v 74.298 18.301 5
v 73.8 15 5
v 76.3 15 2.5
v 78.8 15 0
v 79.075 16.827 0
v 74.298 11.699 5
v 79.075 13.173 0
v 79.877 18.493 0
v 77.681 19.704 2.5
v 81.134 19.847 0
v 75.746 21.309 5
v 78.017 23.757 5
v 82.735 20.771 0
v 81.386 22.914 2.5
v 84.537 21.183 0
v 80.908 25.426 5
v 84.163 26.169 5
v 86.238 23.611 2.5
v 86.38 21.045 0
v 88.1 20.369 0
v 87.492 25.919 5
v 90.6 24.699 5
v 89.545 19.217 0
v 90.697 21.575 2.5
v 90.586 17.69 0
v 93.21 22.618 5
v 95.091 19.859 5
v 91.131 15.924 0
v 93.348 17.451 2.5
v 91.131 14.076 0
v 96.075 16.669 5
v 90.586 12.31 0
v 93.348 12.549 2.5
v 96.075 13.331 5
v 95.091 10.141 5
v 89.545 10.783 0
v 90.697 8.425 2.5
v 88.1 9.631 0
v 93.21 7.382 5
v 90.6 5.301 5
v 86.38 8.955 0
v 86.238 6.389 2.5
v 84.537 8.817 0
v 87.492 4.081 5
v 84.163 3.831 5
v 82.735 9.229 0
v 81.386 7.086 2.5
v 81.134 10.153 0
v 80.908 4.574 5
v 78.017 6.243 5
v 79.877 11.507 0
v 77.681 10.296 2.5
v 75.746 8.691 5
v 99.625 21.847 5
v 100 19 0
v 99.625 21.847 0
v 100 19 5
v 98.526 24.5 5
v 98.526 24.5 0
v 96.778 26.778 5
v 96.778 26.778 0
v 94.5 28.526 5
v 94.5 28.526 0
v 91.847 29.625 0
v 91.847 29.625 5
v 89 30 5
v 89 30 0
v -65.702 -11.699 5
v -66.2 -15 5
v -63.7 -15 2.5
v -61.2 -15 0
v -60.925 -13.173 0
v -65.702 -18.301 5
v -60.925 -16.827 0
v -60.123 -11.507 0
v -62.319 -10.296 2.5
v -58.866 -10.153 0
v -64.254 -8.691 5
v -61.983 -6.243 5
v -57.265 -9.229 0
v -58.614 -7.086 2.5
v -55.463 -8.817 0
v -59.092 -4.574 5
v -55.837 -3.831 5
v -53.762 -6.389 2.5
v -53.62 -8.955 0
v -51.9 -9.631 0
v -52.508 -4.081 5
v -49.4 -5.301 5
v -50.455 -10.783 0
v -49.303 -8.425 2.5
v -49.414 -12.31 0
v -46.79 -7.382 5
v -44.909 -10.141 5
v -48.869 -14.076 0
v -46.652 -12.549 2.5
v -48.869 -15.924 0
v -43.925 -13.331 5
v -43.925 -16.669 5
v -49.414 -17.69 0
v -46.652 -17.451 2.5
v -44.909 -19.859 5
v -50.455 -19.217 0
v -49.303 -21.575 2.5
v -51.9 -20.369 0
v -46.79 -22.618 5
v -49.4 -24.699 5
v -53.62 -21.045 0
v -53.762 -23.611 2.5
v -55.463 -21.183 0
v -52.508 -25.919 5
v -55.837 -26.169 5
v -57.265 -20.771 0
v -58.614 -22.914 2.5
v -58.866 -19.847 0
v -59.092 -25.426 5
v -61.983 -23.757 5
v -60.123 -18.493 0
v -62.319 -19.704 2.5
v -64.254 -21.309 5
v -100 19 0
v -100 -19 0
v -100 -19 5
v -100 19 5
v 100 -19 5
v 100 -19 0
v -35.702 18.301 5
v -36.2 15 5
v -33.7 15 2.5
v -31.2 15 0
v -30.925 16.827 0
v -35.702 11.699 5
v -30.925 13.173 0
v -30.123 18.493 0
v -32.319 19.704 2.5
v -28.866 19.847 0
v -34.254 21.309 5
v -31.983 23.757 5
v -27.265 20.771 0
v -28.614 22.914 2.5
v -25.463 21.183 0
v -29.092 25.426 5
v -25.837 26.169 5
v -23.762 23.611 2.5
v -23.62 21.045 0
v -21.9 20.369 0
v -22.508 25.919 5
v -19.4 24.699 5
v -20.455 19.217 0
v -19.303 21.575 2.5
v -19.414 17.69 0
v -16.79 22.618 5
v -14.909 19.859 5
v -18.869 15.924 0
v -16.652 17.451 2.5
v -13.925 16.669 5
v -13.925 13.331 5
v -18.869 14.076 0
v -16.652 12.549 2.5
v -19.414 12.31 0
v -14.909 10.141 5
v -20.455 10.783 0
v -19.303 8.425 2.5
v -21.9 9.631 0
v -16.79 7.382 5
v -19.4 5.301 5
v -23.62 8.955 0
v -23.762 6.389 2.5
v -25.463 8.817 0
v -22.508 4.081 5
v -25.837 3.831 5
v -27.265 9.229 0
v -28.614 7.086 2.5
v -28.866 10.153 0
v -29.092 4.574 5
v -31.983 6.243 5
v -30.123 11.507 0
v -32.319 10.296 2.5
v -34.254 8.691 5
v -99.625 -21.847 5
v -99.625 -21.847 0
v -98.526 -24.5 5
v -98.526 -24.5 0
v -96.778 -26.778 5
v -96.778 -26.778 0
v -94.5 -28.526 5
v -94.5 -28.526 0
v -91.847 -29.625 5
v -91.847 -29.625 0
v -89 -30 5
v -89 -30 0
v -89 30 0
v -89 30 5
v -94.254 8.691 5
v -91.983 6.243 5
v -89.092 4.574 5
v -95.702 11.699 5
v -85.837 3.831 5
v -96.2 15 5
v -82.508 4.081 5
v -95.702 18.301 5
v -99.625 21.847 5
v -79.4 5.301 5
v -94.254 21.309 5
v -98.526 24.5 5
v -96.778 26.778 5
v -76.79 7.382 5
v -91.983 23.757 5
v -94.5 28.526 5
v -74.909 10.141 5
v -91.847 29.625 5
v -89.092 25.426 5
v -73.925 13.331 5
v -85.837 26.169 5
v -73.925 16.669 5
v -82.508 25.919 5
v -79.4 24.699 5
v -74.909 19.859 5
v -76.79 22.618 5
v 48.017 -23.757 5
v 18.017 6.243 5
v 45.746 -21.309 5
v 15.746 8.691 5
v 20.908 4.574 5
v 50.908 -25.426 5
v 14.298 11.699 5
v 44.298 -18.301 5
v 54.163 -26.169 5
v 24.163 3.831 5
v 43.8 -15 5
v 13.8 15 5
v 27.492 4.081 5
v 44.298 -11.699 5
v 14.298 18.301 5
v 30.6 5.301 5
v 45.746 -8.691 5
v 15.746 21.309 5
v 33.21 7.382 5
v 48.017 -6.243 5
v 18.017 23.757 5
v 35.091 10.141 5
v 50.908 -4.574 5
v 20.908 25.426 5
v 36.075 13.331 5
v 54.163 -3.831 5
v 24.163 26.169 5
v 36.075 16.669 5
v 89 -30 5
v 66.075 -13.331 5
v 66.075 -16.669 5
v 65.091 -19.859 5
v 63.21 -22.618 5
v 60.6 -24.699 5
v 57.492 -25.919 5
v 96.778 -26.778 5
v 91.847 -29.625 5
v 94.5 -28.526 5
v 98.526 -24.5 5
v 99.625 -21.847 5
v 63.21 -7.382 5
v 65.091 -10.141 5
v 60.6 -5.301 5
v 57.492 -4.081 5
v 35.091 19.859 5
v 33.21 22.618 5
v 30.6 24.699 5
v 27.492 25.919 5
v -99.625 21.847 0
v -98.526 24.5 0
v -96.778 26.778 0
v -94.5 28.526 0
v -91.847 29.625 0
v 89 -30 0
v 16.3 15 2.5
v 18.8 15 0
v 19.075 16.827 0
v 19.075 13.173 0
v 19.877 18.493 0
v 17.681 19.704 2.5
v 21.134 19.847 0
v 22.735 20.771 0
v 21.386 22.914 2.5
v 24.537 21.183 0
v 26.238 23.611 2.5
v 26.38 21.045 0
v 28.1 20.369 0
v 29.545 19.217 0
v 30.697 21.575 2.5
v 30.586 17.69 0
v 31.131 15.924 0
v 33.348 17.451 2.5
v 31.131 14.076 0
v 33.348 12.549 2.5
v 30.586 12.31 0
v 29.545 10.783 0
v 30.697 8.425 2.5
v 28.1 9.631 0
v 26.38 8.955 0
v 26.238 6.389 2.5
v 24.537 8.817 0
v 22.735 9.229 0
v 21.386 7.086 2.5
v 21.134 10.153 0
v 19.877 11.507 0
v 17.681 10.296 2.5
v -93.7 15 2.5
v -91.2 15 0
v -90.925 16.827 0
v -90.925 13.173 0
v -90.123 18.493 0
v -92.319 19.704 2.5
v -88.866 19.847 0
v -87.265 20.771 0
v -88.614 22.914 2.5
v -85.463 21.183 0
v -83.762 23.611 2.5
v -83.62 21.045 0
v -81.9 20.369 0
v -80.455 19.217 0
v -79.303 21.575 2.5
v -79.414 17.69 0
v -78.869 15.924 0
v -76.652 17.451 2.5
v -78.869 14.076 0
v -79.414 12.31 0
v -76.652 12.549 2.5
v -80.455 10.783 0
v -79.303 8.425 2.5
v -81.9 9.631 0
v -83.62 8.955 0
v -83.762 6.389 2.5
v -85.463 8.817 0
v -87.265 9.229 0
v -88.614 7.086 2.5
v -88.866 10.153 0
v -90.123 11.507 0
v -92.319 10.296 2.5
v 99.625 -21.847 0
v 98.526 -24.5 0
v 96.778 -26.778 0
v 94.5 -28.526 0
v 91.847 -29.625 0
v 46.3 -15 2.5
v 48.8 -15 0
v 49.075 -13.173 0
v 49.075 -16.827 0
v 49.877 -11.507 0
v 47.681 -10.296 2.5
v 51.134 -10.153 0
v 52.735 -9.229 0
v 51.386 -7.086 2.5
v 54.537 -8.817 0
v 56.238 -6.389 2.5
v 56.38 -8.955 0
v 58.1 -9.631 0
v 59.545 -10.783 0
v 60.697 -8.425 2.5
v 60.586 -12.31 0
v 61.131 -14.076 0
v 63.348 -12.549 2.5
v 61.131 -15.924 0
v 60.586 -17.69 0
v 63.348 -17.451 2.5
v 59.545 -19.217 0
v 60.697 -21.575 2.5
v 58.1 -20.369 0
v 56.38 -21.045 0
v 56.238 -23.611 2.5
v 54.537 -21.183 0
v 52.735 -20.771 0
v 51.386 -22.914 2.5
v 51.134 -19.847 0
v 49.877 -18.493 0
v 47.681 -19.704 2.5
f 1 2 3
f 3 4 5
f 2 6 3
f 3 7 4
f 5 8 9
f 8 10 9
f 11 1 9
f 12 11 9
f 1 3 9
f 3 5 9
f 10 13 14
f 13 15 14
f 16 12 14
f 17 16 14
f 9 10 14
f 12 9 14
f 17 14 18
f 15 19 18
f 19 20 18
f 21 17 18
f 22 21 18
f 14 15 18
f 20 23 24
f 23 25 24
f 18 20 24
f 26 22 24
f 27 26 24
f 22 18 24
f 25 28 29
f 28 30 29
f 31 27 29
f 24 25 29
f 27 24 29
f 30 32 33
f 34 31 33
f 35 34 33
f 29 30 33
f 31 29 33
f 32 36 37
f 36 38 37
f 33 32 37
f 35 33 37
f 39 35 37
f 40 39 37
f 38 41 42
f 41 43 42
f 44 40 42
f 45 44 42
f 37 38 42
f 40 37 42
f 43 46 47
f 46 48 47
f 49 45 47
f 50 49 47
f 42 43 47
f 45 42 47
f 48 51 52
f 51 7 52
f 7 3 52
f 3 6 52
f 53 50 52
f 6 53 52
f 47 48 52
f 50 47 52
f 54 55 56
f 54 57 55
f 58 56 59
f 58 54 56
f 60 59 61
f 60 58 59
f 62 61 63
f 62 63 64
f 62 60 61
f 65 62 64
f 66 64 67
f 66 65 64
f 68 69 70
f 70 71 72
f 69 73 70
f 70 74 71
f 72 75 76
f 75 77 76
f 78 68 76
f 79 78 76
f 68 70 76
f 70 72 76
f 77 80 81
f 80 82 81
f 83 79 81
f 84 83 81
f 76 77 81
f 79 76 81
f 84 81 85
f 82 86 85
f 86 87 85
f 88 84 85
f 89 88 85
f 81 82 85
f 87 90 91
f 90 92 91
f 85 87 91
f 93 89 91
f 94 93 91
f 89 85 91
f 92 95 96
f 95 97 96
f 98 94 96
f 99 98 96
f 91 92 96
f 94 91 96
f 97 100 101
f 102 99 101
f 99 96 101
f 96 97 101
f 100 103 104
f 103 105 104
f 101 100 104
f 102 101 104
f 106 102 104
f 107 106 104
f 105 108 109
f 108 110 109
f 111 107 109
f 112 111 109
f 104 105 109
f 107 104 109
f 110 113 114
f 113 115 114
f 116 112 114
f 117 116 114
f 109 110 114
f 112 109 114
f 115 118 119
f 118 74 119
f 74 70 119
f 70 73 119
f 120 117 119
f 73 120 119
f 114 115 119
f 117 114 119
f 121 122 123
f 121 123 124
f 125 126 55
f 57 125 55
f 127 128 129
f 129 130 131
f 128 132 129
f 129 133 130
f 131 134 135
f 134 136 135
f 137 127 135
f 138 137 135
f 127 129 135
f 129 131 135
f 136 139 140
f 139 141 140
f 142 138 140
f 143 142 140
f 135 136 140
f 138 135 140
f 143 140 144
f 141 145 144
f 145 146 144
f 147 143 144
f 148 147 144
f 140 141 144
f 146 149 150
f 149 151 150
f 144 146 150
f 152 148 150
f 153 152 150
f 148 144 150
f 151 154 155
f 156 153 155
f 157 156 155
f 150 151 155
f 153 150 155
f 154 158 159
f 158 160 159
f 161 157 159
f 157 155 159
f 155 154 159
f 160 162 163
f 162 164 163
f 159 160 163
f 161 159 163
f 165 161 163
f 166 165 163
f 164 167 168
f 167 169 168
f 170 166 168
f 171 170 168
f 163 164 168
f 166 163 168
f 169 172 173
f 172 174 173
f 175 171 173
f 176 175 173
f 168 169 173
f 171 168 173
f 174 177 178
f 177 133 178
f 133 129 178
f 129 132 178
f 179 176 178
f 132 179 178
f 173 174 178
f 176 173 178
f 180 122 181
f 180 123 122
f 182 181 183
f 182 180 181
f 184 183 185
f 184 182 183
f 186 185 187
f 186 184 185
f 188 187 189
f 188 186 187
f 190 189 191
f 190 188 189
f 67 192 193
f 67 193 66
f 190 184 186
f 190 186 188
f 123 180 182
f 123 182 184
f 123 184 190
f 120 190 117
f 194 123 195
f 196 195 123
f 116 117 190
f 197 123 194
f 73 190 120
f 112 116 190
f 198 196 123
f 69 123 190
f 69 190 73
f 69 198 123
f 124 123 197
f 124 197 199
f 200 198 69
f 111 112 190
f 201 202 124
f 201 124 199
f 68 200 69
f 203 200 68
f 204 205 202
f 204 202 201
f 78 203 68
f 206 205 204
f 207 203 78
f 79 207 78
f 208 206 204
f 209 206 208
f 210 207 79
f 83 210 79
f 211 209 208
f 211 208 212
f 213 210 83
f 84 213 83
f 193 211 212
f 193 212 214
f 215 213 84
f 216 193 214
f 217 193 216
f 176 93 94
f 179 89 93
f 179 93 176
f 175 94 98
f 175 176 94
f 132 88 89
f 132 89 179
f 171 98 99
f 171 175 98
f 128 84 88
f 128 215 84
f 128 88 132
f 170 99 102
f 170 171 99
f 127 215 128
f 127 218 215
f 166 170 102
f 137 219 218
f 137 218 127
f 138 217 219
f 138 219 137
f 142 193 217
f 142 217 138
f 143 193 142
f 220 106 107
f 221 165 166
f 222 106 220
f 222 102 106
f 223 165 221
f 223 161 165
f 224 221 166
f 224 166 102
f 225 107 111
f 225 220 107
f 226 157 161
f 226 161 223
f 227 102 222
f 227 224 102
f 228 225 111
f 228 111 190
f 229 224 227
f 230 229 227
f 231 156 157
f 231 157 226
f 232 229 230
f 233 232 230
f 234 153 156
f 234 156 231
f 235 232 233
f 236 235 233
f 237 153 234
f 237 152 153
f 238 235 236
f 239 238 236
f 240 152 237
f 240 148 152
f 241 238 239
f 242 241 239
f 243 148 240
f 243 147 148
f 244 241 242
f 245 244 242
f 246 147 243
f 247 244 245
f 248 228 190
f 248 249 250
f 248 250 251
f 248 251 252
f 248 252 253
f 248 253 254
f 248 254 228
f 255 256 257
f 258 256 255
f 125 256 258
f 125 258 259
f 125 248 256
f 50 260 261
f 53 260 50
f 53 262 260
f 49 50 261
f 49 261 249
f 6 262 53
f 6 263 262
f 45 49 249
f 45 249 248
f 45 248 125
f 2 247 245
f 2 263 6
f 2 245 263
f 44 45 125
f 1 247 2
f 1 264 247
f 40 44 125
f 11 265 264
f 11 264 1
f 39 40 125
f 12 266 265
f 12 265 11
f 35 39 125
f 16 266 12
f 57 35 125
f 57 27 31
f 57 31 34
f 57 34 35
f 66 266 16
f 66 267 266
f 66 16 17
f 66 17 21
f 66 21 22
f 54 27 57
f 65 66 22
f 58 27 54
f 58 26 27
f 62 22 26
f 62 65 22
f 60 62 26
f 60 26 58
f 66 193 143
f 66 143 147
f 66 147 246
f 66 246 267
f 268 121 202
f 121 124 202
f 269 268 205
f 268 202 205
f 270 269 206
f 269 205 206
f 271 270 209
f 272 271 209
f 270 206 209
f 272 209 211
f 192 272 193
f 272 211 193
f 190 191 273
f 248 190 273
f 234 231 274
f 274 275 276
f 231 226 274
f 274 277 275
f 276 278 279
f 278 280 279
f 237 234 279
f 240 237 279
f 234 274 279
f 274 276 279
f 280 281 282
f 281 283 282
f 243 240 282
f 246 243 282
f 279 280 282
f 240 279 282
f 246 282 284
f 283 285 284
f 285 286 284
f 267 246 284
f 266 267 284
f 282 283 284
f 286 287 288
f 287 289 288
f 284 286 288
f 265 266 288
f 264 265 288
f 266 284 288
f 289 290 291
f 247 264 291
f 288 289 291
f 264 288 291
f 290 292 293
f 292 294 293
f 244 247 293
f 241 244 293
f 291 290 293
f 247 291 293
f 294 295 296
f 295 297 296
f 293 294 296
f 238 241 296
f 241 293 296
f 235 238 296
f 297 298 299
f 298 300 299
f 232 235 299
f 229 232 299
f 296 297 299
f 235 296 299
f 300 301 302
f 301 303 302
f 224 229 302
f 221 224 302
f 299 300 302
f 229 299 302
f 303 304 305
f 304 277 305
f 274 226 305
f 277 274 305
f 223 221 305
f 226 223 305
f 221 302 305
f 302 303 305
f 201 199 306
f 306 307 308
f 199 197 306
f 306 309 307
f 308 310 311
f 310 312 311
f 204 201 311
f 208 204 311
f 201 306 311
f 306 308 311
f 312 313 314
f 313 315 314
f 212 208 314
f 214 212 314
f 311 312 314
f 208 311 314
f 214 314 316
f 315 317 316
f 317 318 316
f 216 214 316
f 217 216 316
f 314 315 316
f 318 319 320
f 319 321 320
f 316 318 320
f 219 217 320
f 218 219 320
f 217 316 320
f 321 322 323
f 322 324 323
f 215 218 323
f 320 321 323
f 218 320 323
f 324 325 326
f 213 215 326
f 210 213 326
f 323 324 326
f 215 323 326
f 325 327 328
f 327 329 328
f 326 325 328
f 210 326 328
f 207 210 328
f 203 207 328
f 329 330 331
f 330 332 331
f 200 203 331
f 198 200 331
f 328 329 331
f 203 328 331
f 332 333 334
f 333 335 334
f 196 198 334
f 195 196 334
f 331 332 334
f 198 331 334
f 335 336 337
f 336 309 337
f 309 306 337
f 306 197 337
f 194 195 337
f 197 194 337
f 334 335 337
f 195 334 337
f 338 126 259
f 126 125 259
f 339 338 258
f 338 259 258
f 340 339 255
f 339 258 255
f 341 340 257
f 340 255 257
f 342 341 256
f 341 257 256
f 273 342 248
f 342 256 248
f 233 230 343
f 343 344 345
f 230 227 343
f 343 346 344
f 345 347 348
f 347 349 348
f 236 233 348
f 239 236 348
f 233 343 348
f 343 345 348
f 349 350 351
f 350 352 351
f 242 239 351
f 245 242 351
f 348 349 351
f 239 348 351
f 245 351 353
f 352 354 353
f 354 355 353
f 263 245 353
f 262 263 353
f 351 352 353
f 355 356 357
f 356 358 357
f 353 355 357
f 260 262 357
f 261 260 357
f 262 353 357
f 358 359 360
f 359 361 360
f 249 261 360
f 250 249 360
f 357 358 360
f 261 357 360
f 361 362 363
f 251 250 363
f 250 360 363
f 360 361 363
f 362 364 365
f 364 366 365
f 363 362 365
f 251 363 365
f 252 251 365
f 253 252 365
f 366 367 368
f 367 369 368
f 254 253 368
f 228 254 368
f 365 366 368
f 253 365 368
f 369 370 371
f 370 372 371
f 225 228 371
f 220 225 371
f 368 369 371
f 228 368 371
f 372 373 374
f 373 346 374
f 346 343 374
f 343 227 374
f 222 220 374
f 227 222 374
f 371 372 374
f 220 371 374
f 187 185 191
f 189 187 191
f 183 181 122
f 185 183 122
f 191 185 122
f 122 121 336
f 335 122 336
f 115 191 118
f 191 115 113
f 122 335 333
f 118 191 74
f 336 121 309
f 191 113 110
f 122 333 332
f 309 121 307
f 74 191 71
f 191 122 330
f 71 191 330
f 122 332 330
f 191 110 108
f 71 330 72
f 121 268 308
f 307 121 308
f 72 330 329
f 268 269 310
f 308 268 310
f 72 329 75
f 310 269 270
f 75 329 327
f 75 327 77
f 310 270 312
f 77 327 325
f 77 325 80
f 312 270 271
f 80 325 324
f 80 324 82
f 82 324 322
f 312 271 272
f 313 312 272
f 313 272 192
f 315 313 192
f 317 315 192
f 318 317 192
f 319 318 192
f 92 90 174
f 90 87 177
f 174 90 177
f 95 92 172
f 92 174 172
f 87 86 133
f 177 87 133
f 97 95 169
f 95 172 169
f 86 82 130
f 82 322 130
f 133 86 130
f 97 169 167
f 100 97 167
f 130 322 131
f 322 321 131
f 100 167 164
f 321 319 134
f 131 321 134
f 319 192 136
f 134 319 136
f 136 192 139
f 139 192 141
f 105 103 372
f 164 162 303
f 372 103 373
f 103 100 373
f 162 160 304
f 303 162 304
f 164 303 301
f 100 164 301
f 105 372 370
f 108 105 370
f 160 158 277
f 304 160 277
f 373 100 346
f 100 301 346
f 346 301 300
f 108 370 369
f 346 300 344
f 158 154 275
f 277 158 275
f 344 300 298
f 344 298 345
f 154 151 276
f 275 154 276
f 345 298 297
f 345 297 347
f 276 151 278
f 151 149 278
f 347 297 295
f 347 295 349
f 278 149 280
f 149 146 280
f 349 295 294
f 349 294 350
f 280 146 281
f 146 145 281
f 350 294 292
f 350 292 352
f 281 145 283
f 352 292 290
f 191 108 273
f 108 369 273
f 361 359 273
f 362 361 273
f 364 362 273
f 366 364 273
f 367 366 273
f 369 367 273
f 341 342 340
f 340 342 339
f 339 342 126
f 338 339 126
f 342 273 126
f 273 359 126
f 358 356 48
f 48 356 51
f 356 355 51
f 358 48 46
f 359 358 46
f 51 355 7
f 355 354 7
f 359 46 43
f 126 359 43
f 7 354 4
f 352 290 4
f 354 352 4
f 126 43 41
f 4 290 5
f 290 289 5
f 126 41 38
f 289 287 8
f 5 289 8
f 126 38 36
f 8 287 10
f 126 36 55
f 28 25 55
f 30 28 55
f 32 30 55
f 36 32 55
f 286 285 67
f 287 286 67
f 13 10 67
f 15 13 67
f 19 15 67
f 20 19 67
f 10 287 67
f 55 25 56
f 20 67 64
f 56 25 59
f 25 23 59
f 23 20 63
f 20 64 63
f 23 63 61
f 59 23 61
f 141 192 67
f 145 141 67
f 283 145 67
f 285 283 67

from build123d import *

# Parameters (mm, degrees)
F0_W           = 200
F0_H           = 60
F1_DEPTH       = 5
F3_D           = 11
F3_CSINK_D     = 22.4
F3_CSINK_ANGLE = 90
F4_R           = 11


with BuildPart() as f1:
    # F0 (on Top) → F1 (new body)
    with BuildSketch(Plane.XY):
        Rectangle(F0_W, F0_H)
    extrude(amount=F1_DEPTH)

    # F3 (through all)
    with Locations(Plane.XY.offset(5)):
        with Locations((-85, 15), (-25, 15), (25, 15), (-55, -15), (55, -15), (85, 15)):
            CounterSinkHole(F3_D / 2, F3_CSINK_D / 2, counter_sink_angle=F3_CSINK_ANGLE)

    # F4
    f4_edges = [f1.edges().sort_by_distance(p)[0] for p in [
        (-100, 30, 2.5),
        (-100, -30, 2.5),
        (100, -30, 2.5),
        (100, 30, 2.5),
    ]]
    fillet(f4_edges, radius=F4_R)


solid = f1.part
